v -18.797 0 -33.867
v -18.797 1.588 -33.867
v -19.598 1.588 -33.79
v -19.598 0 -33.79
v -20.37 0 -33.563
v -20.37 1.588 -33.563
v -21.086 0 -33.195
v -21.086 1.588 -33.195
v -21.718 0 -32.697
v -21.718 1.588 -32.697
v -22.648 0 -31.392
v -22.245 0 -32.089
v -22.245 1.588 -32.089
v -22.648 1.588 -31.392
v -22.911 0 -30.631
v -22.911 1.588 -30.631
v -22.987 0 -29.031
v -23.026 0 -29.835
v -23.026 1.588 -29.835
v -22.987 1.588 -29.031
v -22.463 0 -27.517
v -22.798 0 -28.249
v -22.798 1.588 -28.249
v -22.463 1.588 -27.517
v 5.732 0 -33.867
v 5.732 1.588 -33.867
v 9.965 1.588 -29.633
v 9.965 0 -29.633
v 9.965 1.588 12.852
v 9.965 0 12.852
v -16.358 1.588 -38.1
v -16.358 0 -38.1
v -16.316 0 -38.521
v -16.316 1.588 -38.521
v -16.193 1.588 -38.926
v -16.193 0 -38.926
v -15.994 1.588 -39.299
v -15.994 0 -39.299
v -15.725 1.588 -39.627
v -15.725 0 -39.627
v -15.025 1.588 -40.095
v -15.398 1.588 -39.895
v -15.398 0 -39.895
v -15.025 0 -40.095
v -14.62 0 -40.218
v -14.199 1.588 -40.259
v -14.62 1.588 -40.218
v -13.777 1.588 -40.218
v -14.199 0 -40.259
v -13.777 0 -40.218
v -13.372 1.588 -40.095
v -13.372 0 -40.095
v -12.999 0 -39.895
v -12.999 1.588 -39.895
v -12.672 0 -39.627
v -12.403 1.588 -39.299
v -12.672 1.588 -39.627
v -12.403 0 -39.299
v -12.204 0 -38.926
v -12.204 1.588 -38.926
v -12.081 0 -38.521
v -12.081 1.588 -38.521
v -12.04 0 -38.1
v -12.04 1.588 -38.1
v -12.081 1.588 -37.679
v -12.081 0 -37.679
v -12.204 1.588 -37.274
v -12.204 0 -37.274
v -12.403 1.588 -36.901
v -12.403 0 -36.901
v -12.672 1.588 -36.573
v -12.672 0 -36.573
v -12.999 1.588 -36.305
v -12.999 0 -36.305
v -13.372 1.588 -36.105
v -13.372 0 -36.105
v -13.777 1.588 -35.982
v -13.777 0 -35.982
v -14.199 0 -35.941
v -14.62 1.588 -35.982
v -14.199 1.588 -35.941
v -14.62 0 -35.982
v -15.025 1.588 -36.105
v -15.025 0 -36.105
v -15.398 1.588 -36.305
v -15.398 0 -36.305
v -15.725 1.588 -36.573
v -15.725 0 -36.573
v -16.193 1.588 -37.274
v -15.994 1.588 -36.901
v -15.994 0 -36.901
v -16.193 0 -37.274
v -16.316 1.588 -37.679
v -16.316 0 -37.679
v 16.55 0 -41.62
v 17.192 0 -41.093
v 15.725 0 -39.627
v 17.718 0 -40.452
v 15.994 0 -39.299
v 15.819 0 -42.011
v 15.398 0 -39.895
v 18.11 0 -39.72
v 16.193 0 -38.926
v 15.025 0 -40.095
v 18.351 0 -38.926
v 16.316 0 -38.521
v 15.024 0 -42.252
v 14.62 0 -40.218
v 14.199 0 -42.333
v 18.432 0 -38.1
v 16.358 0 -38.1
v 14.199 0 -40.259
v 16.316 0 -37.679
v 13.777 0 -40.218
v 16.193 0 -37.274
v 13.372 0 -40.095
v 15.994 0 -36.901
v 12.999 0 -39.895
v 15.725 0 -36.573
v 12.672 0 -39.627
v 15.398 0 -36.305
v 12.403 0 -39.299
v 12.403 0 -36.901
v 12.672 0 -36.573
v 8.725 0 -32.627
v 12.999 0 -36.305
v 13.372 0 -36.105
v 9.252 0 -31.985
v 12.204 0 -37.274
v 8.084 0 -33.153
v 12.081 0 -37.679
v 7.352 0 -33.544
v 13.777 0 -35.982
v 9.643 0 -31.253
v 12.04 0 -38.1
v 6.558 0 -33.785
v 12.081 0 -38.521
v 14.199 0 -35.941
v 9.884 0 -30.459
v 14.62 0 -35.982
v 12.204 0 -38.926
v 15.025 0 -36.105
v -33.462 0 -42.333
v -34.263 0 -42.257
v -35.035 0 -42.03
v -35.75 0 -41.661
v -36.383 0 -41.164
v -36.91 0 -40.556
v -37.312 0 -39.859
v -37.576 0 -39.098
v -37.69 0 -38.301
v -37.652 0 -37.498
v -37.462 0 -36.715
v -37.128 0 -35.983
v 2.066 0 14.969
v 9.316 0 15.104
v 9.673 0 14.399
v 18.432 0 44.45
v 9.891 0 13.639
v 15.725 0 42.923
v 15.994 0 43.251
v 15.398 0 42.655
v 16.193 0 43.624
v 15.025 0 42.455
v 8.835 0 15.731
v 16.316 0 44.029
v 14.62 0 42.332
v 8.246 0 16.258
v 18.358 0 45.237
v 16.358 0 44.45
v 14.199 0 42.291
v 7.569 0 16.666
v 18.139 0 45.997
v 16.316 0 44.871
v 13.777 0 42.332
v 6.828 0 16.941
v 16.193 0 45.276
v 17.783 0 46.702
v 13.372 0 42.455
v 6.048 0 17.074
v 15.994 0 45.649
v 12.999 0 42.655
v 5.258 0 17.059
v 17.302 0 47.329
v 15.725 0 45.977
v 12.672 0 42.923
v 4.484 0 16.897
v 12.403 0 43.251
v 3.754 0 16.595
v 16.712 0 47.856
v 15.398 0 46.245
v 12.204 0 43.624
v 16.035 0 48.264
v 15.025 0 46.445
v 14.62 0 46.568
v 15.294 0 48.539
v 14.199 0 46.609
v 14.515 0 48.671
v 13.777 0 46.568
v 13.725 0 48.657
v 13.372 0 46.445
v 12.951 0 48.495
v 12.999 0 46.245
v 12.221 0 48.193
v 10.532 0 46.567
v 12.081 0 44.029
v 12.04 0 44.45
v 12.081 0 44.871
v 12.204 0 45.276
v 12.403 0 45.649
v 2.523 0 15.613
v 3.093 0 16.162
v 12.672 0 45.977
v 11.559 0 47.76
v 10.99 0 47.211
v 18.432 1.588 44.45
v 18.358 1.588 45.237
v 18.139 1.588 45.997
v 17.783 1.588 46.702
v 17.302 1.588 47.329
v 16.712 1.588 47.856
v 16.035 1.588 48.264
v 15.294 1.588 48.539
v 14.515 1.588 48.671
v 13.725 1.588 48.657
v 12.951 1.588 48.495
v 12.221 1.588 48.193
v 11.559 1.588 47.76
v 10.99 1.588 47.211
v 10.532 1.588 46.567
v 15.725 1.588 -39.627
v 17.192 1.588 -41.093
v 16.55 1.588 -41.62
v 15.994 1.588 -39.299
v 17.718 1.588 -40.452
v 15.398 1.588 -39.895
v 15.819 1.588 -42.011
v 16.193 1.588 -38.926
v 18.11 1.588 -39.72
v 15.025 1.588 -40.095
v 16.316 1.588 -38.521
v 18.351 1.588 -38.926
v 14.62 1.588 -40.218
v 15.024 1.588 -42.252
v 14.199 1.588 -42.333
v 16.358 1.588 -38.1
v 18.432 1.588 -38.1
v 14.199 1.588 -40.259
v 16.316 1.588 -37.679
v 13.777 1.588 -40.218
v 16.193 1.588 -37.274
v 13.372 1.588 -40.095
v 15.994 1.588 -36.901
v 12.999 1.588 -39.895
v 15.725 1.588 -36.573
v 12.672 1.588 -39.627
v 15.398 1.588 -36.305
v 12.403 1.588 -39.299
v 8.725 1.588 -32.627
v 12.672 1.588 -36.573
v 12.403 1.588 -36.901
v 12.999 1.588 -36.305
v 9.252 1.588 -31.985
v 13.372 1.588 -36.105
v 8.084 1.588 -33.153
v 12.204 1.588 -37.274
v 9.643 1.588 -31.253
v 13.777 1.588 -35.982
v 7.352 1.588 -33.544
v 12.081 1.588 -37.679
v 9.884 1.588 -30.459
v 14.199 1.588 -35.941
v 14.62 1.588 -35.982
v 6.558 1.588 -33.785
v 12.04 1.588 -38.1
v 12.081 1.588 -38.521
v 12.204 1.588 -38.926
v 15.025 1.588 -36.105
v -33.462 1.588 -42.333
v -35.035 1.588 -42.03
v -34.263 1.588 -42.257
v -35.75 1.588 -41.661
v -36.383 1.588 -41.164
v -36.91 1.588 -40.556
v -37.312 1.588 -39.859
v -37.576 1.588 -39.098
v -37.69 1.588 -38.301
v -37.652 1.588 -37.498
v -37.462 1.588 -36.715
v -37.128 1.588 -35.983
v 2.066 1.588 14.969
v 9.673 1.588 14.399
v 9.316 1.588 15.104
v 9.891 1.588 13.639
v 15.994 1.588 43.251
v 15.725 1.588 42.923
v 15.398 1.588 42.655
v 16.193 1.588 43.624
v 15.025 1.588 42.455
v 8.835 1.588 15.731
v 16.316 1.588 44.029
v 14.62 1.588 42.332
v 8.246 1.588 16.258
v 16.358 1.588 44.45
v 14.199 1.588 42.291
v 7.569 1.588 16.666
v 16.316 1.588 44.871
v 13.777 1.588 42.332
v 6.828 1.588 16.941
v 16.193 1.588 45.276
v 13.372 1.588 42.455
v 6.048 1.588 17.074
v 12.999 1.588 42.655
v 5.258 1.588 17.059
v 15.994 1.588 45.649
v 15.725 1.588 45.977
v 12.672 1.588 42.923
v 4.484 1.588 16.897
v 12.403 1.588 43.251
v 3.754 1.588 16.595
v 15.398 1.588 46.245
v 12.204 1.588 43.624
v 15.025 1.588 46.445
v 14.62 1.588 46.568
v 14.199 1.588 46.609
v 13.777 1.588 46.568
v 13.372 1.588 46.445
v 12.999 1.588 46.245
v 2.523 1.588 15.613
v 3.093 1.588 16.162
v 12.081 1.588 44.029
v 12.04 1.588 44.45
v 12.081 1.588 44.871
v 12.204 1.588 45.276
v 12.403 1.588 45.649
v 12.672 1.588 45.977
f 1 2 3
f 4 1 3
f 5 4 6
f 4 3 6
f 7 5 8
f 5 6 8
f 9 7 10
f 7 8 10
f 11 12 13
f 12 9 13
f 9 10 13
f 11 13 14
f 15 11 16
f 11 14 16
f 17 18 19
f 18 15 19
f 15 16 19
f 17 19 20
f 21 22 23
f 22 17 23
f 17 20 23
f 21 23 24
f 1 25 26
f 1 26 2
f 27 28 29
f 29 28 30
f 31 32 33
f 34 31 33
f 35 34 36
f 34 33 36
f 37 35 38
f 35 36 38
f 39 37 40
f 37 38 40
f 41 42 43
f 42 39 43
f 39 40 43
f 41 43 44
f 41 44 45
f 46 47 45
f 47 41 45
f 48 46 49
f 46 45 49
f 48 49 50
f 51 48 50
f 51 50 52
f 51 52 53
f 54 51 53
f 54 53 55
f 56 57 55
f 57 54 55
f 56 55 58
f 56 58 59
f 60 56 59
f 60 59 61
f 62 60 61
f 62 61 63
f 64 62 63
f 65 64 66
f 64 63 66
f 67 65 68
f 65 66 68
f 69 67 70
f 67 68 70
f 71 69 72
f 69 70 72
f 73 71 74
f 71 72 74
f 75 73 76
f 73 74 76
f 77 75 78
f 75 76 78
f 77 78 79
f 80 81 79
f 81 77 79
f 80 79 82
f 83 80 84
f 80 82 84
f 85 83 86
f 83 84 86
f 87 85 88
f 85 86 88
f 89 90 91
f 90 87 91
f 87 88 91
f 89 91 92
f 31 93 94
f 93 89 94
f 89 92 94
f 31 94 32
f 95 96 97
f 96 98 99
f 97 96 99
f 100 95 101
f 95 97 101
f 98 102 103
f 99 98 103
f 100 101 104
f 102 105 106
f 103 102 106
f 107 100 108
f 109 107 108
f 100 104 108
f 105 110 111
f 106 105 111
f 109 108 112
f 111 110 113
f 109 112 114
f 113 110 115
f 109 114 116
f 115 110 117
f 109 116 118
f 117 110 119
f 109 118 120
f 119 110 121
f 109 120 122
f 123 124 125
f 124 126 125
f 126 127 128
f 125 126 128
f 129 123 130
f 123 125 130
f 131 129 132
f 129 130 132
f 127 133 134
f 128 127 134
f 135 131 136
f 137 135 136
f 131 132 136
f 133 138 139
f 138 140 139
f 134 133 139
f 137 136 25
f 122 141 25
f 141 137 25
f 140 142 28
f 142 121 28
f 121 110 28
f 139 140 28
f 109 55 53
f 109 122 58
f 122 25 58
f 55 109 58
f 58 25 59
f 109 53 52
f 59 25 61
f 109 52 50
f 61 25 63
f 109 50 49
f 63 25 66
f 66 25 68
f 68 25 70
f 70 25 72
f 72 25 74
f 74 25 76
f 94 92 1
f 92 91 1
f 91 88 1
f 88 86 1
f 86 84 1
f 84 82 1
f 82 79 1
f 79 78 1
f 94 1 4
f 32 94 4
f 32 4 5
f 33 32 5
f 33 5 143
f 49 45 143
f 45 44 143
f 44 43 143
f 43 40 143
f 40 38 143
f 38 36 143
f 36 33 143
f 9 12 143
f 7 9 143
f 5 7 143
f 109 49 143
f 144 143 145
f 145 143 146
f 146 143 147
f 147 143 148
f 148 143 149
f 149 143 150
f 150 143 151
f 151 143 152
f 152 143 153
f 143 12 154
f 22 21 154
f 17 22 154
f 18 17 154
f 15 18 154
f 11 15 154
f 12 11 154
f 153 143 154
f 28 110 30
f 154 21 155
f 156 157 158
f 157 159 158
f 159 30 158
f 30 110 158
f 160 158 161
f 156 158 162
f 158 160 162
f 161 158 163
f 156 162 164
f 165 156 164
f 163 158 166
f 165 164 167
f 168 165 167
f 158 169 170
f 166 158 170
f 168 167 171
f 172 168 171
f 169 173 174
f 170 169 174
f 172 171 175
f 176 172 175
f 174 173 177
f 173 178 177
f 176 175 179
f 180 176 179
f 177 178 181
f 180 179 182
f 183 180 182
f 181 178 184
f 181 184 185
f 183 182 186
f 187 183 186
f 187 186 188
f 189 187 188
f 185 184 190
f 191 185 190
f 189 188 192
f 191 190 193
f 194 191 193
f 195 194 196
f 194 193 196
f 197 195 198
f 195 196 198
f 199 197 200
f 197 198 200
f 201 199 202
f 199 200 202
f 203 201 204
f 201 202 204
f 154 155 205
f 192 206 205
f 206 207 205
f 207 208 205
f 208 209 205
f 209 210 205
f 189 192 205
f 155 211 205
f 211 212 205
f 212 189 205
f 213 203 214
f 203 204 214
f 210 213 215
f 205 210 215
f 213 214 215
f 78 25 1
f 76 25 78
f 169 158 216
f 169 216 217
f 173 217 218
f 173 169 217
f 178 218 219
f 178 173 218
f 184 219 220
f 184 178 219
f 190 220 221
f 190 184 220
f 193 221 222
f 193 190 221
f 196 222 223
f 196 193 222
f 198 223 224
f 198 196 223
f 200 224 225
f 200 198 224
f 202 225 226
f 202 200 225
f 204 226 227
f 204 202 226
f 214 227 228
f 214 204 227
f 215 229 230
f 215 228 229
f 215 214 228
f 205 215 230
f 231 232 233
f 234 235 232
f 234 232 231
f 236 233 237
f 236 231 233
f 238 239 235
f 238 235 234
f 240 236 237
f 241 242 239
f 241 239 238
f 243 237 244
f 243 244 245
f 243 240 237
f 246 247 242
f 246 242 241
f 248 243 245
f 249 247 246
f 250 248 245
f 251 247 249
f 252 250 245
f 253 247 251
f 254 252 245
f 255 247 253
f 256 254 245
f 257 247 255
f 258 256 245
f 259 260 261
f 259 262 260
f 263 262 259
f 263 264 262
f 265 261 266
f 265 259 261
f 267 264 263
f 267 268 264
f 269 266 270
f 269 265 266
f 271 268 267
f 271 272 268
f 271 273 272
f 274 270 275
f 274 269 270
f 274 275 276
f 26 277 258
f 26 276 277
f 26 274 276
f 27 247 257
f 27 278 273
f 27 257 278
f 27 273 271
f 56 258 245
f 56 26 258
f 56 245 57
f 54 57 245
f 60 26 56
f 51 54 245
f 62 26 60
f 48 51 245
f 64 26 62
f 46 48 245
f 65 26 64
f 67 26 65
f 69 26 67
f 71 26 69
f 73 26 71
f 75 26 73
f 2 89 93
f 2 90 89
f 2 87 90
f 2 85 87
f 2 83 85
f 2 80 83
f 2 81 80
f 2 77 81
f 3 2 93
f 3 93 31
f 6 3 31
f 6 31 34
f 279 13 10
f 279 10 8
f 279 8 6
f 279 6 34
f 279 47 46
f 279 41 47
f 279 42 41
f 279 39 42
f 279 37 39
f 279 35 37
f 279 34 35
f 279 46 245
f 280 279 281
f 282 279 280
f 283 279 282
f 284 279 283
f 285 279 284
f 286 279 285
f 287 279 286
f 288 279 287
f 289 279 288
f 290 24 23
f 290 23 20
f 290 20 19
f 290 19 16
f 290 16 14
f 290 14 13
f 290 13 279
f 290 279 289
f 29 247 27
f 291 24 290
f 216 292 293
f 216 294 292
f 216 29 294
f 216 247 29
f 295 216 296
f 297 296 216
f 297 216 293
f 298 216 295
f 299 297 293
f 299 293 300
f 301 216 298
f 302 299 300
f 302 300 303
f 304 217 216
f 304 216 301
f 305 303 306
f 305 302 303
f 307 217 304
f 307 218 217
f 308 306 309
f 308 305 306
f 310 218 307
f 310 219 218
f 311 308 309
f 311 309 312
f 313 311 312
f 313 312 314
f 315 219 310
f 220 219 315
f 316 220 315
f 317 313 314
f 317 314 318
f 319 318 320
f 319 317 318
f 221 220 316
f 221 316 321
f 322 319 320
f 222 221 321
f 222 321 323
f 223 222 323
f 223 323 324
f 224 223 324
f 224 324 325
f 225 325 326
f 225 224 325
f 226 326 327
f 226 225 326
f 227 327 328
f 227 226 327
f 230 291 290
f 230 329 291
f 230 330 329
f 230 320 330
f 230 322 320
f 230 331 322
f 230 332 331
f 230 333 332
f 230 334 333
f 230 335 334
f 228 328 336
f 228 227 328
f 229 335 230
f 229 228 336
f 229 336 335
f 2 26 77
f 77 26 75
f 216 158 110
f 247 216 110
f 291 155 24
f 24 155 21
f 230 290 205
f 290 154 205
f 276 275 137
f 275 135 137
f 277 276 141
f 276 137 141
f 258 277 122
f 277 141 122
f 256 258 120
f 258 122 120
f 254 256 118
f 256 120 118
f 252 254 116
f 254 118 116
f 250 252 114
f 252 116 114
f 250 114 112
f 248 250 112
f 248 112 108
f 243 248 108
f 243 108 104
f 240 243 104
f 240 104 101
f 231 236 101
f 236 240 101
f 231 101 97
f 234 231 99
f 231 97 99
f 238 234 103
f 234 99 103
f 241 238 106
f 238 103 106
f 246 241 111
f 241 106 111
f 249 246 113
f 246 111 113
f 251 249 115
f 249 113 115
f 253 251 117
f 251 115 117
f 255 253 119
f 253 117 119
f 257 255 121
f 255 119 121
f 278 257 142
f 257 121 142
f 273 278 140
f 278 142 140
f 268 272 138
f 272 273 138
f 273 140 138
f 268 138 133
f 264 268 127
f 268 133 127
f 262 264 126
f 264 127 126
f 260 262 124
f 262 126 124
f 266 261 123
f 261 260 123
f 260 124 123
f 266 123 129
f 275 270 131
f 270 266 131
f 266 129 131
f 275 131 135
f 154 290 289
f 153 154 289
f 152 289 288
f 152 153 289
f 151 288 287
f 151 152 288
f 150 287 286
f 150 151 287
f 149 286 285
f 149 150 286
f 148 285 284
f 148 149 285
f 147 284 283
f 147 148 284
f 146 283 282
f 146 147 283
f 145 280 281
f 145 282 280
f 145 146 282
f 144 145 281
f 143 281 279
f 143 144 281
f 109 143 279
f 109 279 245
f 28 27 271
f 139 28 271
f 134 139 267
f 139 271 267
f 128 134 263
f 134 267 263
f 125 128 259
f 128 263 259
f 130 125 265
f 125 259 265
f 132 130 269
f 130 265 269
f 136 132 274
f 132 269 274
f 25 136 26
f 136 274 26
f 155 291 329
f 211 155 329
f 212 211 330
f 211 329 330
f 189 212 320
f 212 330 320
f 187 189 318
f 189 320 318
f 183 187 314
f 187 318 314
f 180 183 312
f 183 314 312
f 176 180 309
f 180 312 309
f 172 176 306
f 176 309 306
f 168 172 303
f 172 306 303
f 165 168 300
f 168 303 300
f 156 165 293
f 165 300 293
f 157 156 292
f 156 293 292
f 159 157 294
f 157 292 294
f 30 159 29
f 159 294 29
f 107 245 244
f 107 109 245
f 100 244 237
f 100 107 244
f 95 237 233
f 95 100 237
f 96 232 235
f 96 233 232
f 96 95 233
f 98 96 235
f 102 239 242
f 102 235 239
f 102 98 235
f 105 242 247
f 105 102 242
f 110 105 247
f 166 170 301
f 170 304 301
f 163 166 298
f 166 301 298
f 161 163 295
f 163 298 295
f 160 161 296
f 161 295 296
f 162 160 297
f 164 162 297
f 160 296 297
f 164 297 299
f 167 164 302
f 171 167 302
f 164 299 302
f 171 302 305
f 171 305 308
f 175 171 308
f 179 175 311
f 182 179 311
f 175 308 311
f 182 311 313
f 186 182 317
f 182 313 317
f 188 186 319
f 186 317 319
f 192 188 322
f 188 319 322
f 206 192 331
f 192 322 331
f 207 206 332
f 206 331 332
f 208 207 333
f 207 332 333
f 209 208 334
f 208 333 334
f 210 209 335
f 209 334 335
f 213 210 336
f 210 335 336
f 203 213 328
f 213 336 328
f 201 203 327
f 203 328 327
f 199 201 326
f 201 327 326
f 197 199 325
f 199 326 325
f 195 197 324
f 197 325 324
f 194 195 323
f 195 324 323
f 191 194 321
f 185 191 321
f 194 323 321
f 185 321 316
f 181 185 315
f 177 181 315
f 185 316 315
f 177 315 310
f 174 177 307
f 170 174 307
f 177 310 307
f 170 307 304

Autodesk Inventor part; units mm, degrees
ref_plane "YZ Plane" through (0, 0, 0) normal (1, 0, 0) x (0, 1, 0)
ref_plane "XZ Plane" through (0, 0, 0) normal (0, 1, 0) x (-1, 0, 0)
ref_plane "XY Plane" through (0, 0, 0) normal (0, 0, 1) x (1, 0, 0)
sketch "Sketch2" plane through (0, 0, 0) normal (0, 1, 0) x (-1, 0, 0)
  circle A0 centre (0, 0) radius 34.925
  line L0 (0, 0) -> (0, -38.1)
  line L1 (0, -38.1) -> (-14.1986, -38.1)
  line L2 (-14.1986, -38.1) -> (14.1986, -38.1)
  circle A1 centre (14.1986, -38.1) radius 2.159
  circle A2 centre (-14.1986, -38.1) radius 2.159
  circle A3 centre (-14.1986, -38.1) radius 4.2333
  line L3 (-14.1986, -38.1) -> (-14.1986, 44.45) construction
  line L4 (-9.9653, -38.1) -> (-9.9653, 44.45)
  line L5 (-18.4319, 44.45) -> (-18.4319, -38.1)
  arc A4 (-18.4319, -38.1) -> (-9.9653, -38.1) centre (-14.1986, -38.1) ccw
  arc A5 (-9.9653, 44.45) -> (-18.4319, 44.45) centre (-14.1986, 44.45) ccw
  line L6 (-14.1986, 44.45) -> (33.4617, -38.1) construction
  line L7 (-17.8648, 42.3333) -> (29.7955, -40.2167)
  line L8 (37.1278, -35.9833) -> (-10.5324, 46.5667)
  arc A6 (-10.5324, 46.5667) -> (-17.8648, 42.3333) centre (-14.1986, 44.45) ccw
  arc A7 (29.7955, -40.2167) -> (37.1278, -35.9833) centre (33.4617, -38.1) ccw
  line L9 (-14.1986, 44.45) -> (81.1219, 44.45) construction
  line L10 (-14.1986, -38.1) -> (33.4617, -38.1) construction
  line L11 (-14.1986, -33.8667) -> (33.4617, -33.8667)
  line L12 (33.4617, -42.3333) -> (-14.1986, -42.3333)
  arc A8 (-14.1986, -33.8667) -> (-14.1986, -42.3333) centre (-14.1986, -38.1) ccw
  arc A9 (33.4617, -42.3333) -> (33.4617, -33.8667) centre (33.4617, -38.1) ccw
  point P0 (-14.1986, 3.175)
  point P1 (9.6315, 3.175)
  point P2 (9.6315, -38.1)
  point P3 (-9.9653, 28.651)
  point P4 (26.1293, -33.8667)
  point P5 (-9.9653, -33.8667)
  point P6 (-18.4319, -38.1)
  dimension "d17" = 69.85
  dimension "d18" = 38.1
  dimension "d19" = 14.1986
  dimension "d20" = 28.3972
  dimension "d21" = 4.318
  dimension "d22" = 4.318
  dimension "d23" = 8.4667
  dimension "d24" = 82.55
  dimension "d25" = 8.4667
  dimension "d26" = 60
  dimension "d27" = 8.4667
extrude "Extrusion2" add sketch "Sketch2" along normal blind 1.5875 contours L8 A0 L7 L4 | A0 L4 A5 L8 | L8 A9 L11 L7 A0 | L4 L7 A0 | A0 L7 A6 A5 L4 | A7 L7 L11 A9 | L7 L4 A0 L5 | A0 L5 A6 L7 | L11 L7 A7 L12 A3 L1 L0 A0 | A0 L0 L11 | L4 L11 A3 L5 A0 | L0 L1 L4 L11 A0 | A0 L11 L0 | A3 | L4 A3 L11
fillet "Fillet4" radius 4.2333 3 edges at (-26.1293, 0.7937, -33.8667) (9.9653, 0.7937, -33.8667) (9.9653, 0.7937, 28.651)
sketch "Sketch3" plane through (0, 1.5875, 0) normal (0, 1, 0) x (1, 0, 0)
  arc A0 (10.5324, -46.5667) -> (18.4319, -44.45) centre (14.1986, -44.45) ccw projected
  circle A1 centre (14.1986, -44.45) radius 2.159
  point P0 (0, 0)
  dimension "d31" = 4.318
extrude "Extrusion3" cut sketch "Sketch3" against normal blind 1.5875
properties part number "sheet1" material "Acetal Resin, Black"
